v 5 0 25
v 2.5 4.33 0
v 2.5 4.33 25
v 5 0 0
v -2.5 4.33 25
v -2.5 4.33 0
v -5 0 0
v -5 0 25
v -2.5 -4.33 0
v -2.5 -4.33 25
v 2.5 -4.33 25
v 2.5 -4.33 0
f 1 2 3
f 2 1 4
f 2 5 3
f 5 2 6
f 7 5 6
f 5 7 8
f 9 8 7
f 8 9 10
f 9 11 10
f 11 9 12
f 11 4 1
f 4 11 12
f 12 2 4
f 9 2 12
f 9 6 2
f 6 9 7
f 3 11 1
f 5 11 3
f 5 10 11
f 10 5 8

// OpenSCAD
/** Created by Jose Araujo. 2014-6-7.

    Just standard hex key (parametric) with no handle; 
*/


module Hex(
				radius // radius in mm
				, h // height of hex
		 ){
cylinder ( r= radius, h =h, $fn = 6 ) ;
}

Hex(radius = 5,h  = 25);
